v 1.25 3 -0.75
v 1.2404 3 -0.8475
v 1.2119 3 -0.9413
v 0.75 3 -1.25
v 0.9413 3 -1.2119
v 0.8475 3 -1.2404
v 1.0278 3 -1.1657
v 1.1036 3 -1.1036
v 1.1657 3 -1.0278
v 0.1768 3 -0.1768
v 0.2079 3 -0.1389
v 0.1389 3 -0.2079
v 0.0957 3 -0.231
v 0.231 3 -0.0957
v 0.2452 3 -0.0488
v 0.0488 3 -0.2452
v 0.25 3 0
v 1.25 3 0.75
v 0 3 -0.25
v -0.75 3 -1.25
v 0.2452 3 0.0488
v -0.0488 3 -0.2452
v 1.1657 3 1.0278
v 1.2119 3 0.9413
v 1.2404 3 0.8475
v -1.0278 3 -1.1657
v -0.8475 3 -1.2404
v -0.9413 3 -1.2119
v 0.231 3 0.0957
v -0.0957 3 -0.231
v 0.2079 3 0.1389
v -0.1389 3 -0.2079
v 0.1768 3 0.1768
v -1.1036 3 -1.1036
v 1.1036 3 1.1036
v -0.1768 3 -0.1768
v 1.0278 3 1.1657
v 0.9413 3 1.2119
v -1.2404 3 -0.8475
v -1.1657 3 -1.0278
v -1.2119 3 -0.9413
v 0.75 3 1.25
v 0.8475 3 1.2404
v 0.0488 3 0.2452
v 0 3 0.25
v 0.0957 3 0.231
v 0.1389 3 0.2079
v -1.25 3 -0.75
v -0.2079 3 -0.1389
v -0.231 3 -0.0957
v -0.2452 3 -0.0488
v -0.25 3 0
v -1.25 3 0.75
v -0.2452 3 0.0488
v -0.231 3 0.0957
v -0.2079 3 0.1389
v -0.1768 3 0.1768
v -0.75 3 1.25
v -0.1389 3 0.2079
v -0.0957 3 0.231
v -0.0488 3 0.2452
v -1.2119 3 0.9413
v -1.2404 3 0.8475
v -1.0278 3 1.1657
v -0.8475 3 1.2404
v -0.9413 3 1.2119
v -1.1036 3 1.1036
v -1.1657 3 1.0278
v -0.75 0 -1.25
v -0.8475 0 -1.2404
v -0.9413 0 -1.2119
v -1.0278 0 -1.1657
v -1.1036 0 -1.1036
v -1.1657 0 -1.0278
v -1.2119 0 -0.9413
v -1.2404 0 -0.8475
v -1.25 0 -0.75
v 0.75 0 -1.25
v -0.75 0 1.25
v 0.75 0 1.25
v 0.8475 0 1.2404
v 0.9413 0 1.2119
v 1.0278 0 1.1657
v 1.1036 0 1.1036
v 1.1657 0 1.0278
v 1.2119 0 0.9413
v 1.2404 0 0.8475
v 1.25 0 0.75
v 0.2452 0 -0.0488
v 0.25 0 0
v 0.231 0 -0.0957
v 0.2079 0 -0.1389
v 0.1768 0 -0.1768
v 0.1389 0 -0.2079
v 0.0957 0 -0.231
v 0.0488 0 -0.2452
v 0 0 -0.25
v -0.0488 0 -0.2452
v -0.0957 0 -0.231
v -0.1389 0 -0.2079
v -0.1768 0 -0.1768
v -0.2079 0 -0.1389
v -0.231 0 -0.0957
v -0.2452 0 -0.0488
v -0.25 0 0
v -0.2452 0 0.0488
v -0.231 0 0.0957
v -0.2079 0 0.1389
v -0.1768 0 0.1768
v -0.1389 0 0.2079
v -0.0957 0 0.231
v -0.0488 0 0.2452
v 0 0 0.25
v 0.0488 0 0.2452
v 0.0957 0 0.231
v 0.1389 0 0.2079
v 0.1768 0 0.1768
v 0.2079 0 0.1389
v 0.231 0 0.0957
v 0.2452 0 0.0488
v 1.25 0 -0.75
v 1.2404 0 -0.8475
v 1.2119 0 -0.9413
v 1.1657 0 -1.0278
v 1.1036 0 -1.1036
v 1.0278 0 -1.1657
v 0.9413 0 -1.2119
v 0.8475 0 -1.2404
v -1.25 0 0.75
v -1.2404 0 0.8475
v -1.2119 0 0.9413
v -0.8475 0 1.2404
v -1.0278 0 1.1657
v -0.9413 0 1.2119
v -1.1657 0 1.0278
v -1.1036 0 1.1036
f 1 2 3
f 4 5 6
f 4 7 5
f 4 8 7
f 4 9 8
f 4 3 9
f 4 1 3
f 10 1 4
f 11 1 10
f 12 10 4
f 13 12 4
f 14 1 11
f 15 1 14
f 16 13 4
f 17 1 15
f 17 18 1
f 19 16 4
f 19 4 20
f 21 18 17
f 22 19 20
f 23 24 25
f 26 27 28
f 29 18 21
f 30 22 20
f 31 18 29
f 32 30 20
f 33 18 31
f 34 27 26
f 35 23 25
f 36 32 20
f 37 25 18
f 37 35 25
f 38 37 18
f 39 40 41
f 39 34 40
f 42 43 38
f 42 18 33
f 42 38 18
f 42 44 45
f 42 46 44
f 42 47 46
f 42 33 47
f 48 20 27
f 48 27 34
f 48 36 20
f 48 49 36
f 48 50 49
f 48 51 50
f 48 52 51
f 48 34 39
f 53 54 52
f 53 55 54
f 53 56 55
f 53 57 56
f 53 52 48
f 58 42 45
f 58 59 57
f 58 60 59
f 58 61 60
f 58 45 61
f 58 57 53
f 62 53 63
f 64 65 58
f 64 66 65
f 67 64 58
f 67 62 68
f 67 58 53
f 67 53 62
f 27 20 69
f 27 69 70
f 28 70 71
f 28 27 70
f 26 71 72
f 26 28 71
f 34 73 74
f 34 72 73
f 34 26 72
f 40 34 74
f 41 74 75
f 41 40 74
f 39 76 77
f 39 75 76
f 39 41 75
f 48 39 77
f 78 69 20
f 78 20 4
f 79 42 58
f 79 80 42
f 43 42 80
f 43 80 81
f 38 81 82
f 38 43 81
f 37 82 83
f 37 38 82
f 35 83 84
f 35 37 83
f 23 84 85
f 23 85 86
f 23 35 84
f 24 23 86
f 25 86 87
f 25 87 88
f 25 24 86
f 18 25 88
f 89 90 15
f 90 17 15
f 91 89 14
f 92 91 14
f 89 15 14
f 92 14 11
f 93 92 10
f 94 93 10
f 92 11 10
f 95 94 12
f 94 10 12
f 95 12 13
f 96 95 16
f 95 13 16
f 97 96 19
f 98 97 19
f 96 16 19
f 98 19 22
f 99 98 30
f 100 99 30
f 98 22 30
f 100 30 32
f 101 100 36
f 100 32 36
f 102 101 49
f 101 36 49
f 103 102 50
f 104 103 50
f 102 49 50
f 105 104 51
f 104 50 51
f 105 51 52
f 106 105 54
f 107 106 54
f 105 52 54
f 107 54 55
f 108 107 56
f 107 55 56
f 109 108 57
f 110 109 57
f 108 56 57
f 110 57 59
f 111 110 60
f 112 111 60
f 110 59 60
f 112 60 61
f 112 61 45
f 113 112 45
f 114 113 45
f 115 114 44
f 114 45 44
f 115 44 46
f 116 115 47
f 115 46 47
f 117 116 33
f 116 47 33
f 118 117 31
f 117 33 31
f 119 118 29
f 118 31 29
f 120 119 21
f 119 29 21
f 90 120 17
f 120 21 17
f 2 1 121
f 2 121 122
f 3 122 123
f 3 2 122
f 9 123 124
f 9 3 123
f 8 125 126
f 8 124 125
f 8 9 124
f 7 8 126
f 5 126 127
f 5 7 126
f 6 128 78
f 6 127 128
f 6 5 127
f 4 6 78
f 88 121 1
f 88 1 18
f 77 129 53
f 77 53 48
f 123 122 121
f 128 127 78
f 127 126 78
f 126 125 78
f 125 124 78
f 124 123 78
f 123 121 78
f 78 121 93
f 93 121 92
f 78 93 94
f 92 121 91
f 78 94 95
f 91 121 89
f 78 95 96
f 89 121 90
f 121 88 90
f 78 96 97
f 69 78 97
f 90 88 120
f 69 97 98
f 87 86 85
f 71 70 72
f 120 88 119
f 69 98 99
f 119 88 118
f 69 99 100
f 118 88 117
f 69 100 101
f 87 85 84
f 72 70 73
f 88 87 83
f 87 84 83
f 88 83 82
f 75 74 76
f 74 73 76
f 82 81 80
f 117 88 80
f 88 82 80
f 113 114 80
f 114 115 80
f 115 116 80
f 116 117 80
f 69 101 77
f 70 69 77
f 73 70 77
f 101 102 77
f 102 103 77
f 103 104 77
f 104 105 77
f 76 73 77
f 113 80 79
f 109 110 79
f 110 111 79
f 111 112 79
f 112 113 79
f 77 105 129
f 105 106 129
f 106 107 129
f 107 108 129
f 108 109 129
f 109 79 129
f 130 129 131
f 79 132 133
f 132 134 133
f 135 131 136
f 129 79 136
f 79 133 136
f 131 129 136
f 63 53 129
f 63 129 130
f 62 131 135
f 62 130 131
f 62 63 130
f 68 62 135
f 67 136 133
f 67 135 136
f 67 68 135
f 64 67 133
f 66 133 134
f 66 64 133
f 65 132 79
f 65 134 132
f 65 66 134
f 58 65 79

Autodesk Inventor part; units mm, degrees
ref_plane "YZ Plane" through (0, 0, 0) normal (1, 0, 0) x (0, 1, 0)
ref_plane "XZ Plane" through (0, 0, 0) normal (0, 1, 0) x (-1, 0, 0)
ref_plane "XY Plane" through (0, 0, 0) normal (0, 0, 1) x (1, 0, 0)
sketch "Sketch1" plane through (0, 0, 0) normal (0, 1, 0) x (-1, 0, 0)
  line L0 (-1.25, 1.25) -> (1.25, 1.25)
  line L1 (1.25, 1.25) -> (1.25, -1.25)
  line L2 (1.25, -1.25) -> (-1.25, -1.25)
  line L3 (-1.25, -1.25) -> (-1.25, 1.25)
  line L4 (-1.25, 1.25) -> (1.25, -1.25) construction
  line L5 (1.25, 1.25) -> (-1.25, -1.25) construction
  point P0 (0, 0)
  dimension "d0" = 2.5
  dimension "d1" = 2.5
extrude "Extrusion1" add sketch "Sketch1" along normal blind 3
fillet "Fillet1" radius 0.5 4 edges at (-1.25, 1.5, 1.25) (1.25, 1.5, 1.25) (1.25, 1.5, -1.25) (-1.25, 1.5, -1.25)
sketch "Sketch2" plane through (0, 3, 0) normal (0, 1, 0) x (1, 0, 0)
  circle A0 centre (0, 0) radius 0.25
  dimension "d5" = 0.5
extrude "Extrusion2" cut sketch "Sketch2" against normal blind 3
properties part number "block"
